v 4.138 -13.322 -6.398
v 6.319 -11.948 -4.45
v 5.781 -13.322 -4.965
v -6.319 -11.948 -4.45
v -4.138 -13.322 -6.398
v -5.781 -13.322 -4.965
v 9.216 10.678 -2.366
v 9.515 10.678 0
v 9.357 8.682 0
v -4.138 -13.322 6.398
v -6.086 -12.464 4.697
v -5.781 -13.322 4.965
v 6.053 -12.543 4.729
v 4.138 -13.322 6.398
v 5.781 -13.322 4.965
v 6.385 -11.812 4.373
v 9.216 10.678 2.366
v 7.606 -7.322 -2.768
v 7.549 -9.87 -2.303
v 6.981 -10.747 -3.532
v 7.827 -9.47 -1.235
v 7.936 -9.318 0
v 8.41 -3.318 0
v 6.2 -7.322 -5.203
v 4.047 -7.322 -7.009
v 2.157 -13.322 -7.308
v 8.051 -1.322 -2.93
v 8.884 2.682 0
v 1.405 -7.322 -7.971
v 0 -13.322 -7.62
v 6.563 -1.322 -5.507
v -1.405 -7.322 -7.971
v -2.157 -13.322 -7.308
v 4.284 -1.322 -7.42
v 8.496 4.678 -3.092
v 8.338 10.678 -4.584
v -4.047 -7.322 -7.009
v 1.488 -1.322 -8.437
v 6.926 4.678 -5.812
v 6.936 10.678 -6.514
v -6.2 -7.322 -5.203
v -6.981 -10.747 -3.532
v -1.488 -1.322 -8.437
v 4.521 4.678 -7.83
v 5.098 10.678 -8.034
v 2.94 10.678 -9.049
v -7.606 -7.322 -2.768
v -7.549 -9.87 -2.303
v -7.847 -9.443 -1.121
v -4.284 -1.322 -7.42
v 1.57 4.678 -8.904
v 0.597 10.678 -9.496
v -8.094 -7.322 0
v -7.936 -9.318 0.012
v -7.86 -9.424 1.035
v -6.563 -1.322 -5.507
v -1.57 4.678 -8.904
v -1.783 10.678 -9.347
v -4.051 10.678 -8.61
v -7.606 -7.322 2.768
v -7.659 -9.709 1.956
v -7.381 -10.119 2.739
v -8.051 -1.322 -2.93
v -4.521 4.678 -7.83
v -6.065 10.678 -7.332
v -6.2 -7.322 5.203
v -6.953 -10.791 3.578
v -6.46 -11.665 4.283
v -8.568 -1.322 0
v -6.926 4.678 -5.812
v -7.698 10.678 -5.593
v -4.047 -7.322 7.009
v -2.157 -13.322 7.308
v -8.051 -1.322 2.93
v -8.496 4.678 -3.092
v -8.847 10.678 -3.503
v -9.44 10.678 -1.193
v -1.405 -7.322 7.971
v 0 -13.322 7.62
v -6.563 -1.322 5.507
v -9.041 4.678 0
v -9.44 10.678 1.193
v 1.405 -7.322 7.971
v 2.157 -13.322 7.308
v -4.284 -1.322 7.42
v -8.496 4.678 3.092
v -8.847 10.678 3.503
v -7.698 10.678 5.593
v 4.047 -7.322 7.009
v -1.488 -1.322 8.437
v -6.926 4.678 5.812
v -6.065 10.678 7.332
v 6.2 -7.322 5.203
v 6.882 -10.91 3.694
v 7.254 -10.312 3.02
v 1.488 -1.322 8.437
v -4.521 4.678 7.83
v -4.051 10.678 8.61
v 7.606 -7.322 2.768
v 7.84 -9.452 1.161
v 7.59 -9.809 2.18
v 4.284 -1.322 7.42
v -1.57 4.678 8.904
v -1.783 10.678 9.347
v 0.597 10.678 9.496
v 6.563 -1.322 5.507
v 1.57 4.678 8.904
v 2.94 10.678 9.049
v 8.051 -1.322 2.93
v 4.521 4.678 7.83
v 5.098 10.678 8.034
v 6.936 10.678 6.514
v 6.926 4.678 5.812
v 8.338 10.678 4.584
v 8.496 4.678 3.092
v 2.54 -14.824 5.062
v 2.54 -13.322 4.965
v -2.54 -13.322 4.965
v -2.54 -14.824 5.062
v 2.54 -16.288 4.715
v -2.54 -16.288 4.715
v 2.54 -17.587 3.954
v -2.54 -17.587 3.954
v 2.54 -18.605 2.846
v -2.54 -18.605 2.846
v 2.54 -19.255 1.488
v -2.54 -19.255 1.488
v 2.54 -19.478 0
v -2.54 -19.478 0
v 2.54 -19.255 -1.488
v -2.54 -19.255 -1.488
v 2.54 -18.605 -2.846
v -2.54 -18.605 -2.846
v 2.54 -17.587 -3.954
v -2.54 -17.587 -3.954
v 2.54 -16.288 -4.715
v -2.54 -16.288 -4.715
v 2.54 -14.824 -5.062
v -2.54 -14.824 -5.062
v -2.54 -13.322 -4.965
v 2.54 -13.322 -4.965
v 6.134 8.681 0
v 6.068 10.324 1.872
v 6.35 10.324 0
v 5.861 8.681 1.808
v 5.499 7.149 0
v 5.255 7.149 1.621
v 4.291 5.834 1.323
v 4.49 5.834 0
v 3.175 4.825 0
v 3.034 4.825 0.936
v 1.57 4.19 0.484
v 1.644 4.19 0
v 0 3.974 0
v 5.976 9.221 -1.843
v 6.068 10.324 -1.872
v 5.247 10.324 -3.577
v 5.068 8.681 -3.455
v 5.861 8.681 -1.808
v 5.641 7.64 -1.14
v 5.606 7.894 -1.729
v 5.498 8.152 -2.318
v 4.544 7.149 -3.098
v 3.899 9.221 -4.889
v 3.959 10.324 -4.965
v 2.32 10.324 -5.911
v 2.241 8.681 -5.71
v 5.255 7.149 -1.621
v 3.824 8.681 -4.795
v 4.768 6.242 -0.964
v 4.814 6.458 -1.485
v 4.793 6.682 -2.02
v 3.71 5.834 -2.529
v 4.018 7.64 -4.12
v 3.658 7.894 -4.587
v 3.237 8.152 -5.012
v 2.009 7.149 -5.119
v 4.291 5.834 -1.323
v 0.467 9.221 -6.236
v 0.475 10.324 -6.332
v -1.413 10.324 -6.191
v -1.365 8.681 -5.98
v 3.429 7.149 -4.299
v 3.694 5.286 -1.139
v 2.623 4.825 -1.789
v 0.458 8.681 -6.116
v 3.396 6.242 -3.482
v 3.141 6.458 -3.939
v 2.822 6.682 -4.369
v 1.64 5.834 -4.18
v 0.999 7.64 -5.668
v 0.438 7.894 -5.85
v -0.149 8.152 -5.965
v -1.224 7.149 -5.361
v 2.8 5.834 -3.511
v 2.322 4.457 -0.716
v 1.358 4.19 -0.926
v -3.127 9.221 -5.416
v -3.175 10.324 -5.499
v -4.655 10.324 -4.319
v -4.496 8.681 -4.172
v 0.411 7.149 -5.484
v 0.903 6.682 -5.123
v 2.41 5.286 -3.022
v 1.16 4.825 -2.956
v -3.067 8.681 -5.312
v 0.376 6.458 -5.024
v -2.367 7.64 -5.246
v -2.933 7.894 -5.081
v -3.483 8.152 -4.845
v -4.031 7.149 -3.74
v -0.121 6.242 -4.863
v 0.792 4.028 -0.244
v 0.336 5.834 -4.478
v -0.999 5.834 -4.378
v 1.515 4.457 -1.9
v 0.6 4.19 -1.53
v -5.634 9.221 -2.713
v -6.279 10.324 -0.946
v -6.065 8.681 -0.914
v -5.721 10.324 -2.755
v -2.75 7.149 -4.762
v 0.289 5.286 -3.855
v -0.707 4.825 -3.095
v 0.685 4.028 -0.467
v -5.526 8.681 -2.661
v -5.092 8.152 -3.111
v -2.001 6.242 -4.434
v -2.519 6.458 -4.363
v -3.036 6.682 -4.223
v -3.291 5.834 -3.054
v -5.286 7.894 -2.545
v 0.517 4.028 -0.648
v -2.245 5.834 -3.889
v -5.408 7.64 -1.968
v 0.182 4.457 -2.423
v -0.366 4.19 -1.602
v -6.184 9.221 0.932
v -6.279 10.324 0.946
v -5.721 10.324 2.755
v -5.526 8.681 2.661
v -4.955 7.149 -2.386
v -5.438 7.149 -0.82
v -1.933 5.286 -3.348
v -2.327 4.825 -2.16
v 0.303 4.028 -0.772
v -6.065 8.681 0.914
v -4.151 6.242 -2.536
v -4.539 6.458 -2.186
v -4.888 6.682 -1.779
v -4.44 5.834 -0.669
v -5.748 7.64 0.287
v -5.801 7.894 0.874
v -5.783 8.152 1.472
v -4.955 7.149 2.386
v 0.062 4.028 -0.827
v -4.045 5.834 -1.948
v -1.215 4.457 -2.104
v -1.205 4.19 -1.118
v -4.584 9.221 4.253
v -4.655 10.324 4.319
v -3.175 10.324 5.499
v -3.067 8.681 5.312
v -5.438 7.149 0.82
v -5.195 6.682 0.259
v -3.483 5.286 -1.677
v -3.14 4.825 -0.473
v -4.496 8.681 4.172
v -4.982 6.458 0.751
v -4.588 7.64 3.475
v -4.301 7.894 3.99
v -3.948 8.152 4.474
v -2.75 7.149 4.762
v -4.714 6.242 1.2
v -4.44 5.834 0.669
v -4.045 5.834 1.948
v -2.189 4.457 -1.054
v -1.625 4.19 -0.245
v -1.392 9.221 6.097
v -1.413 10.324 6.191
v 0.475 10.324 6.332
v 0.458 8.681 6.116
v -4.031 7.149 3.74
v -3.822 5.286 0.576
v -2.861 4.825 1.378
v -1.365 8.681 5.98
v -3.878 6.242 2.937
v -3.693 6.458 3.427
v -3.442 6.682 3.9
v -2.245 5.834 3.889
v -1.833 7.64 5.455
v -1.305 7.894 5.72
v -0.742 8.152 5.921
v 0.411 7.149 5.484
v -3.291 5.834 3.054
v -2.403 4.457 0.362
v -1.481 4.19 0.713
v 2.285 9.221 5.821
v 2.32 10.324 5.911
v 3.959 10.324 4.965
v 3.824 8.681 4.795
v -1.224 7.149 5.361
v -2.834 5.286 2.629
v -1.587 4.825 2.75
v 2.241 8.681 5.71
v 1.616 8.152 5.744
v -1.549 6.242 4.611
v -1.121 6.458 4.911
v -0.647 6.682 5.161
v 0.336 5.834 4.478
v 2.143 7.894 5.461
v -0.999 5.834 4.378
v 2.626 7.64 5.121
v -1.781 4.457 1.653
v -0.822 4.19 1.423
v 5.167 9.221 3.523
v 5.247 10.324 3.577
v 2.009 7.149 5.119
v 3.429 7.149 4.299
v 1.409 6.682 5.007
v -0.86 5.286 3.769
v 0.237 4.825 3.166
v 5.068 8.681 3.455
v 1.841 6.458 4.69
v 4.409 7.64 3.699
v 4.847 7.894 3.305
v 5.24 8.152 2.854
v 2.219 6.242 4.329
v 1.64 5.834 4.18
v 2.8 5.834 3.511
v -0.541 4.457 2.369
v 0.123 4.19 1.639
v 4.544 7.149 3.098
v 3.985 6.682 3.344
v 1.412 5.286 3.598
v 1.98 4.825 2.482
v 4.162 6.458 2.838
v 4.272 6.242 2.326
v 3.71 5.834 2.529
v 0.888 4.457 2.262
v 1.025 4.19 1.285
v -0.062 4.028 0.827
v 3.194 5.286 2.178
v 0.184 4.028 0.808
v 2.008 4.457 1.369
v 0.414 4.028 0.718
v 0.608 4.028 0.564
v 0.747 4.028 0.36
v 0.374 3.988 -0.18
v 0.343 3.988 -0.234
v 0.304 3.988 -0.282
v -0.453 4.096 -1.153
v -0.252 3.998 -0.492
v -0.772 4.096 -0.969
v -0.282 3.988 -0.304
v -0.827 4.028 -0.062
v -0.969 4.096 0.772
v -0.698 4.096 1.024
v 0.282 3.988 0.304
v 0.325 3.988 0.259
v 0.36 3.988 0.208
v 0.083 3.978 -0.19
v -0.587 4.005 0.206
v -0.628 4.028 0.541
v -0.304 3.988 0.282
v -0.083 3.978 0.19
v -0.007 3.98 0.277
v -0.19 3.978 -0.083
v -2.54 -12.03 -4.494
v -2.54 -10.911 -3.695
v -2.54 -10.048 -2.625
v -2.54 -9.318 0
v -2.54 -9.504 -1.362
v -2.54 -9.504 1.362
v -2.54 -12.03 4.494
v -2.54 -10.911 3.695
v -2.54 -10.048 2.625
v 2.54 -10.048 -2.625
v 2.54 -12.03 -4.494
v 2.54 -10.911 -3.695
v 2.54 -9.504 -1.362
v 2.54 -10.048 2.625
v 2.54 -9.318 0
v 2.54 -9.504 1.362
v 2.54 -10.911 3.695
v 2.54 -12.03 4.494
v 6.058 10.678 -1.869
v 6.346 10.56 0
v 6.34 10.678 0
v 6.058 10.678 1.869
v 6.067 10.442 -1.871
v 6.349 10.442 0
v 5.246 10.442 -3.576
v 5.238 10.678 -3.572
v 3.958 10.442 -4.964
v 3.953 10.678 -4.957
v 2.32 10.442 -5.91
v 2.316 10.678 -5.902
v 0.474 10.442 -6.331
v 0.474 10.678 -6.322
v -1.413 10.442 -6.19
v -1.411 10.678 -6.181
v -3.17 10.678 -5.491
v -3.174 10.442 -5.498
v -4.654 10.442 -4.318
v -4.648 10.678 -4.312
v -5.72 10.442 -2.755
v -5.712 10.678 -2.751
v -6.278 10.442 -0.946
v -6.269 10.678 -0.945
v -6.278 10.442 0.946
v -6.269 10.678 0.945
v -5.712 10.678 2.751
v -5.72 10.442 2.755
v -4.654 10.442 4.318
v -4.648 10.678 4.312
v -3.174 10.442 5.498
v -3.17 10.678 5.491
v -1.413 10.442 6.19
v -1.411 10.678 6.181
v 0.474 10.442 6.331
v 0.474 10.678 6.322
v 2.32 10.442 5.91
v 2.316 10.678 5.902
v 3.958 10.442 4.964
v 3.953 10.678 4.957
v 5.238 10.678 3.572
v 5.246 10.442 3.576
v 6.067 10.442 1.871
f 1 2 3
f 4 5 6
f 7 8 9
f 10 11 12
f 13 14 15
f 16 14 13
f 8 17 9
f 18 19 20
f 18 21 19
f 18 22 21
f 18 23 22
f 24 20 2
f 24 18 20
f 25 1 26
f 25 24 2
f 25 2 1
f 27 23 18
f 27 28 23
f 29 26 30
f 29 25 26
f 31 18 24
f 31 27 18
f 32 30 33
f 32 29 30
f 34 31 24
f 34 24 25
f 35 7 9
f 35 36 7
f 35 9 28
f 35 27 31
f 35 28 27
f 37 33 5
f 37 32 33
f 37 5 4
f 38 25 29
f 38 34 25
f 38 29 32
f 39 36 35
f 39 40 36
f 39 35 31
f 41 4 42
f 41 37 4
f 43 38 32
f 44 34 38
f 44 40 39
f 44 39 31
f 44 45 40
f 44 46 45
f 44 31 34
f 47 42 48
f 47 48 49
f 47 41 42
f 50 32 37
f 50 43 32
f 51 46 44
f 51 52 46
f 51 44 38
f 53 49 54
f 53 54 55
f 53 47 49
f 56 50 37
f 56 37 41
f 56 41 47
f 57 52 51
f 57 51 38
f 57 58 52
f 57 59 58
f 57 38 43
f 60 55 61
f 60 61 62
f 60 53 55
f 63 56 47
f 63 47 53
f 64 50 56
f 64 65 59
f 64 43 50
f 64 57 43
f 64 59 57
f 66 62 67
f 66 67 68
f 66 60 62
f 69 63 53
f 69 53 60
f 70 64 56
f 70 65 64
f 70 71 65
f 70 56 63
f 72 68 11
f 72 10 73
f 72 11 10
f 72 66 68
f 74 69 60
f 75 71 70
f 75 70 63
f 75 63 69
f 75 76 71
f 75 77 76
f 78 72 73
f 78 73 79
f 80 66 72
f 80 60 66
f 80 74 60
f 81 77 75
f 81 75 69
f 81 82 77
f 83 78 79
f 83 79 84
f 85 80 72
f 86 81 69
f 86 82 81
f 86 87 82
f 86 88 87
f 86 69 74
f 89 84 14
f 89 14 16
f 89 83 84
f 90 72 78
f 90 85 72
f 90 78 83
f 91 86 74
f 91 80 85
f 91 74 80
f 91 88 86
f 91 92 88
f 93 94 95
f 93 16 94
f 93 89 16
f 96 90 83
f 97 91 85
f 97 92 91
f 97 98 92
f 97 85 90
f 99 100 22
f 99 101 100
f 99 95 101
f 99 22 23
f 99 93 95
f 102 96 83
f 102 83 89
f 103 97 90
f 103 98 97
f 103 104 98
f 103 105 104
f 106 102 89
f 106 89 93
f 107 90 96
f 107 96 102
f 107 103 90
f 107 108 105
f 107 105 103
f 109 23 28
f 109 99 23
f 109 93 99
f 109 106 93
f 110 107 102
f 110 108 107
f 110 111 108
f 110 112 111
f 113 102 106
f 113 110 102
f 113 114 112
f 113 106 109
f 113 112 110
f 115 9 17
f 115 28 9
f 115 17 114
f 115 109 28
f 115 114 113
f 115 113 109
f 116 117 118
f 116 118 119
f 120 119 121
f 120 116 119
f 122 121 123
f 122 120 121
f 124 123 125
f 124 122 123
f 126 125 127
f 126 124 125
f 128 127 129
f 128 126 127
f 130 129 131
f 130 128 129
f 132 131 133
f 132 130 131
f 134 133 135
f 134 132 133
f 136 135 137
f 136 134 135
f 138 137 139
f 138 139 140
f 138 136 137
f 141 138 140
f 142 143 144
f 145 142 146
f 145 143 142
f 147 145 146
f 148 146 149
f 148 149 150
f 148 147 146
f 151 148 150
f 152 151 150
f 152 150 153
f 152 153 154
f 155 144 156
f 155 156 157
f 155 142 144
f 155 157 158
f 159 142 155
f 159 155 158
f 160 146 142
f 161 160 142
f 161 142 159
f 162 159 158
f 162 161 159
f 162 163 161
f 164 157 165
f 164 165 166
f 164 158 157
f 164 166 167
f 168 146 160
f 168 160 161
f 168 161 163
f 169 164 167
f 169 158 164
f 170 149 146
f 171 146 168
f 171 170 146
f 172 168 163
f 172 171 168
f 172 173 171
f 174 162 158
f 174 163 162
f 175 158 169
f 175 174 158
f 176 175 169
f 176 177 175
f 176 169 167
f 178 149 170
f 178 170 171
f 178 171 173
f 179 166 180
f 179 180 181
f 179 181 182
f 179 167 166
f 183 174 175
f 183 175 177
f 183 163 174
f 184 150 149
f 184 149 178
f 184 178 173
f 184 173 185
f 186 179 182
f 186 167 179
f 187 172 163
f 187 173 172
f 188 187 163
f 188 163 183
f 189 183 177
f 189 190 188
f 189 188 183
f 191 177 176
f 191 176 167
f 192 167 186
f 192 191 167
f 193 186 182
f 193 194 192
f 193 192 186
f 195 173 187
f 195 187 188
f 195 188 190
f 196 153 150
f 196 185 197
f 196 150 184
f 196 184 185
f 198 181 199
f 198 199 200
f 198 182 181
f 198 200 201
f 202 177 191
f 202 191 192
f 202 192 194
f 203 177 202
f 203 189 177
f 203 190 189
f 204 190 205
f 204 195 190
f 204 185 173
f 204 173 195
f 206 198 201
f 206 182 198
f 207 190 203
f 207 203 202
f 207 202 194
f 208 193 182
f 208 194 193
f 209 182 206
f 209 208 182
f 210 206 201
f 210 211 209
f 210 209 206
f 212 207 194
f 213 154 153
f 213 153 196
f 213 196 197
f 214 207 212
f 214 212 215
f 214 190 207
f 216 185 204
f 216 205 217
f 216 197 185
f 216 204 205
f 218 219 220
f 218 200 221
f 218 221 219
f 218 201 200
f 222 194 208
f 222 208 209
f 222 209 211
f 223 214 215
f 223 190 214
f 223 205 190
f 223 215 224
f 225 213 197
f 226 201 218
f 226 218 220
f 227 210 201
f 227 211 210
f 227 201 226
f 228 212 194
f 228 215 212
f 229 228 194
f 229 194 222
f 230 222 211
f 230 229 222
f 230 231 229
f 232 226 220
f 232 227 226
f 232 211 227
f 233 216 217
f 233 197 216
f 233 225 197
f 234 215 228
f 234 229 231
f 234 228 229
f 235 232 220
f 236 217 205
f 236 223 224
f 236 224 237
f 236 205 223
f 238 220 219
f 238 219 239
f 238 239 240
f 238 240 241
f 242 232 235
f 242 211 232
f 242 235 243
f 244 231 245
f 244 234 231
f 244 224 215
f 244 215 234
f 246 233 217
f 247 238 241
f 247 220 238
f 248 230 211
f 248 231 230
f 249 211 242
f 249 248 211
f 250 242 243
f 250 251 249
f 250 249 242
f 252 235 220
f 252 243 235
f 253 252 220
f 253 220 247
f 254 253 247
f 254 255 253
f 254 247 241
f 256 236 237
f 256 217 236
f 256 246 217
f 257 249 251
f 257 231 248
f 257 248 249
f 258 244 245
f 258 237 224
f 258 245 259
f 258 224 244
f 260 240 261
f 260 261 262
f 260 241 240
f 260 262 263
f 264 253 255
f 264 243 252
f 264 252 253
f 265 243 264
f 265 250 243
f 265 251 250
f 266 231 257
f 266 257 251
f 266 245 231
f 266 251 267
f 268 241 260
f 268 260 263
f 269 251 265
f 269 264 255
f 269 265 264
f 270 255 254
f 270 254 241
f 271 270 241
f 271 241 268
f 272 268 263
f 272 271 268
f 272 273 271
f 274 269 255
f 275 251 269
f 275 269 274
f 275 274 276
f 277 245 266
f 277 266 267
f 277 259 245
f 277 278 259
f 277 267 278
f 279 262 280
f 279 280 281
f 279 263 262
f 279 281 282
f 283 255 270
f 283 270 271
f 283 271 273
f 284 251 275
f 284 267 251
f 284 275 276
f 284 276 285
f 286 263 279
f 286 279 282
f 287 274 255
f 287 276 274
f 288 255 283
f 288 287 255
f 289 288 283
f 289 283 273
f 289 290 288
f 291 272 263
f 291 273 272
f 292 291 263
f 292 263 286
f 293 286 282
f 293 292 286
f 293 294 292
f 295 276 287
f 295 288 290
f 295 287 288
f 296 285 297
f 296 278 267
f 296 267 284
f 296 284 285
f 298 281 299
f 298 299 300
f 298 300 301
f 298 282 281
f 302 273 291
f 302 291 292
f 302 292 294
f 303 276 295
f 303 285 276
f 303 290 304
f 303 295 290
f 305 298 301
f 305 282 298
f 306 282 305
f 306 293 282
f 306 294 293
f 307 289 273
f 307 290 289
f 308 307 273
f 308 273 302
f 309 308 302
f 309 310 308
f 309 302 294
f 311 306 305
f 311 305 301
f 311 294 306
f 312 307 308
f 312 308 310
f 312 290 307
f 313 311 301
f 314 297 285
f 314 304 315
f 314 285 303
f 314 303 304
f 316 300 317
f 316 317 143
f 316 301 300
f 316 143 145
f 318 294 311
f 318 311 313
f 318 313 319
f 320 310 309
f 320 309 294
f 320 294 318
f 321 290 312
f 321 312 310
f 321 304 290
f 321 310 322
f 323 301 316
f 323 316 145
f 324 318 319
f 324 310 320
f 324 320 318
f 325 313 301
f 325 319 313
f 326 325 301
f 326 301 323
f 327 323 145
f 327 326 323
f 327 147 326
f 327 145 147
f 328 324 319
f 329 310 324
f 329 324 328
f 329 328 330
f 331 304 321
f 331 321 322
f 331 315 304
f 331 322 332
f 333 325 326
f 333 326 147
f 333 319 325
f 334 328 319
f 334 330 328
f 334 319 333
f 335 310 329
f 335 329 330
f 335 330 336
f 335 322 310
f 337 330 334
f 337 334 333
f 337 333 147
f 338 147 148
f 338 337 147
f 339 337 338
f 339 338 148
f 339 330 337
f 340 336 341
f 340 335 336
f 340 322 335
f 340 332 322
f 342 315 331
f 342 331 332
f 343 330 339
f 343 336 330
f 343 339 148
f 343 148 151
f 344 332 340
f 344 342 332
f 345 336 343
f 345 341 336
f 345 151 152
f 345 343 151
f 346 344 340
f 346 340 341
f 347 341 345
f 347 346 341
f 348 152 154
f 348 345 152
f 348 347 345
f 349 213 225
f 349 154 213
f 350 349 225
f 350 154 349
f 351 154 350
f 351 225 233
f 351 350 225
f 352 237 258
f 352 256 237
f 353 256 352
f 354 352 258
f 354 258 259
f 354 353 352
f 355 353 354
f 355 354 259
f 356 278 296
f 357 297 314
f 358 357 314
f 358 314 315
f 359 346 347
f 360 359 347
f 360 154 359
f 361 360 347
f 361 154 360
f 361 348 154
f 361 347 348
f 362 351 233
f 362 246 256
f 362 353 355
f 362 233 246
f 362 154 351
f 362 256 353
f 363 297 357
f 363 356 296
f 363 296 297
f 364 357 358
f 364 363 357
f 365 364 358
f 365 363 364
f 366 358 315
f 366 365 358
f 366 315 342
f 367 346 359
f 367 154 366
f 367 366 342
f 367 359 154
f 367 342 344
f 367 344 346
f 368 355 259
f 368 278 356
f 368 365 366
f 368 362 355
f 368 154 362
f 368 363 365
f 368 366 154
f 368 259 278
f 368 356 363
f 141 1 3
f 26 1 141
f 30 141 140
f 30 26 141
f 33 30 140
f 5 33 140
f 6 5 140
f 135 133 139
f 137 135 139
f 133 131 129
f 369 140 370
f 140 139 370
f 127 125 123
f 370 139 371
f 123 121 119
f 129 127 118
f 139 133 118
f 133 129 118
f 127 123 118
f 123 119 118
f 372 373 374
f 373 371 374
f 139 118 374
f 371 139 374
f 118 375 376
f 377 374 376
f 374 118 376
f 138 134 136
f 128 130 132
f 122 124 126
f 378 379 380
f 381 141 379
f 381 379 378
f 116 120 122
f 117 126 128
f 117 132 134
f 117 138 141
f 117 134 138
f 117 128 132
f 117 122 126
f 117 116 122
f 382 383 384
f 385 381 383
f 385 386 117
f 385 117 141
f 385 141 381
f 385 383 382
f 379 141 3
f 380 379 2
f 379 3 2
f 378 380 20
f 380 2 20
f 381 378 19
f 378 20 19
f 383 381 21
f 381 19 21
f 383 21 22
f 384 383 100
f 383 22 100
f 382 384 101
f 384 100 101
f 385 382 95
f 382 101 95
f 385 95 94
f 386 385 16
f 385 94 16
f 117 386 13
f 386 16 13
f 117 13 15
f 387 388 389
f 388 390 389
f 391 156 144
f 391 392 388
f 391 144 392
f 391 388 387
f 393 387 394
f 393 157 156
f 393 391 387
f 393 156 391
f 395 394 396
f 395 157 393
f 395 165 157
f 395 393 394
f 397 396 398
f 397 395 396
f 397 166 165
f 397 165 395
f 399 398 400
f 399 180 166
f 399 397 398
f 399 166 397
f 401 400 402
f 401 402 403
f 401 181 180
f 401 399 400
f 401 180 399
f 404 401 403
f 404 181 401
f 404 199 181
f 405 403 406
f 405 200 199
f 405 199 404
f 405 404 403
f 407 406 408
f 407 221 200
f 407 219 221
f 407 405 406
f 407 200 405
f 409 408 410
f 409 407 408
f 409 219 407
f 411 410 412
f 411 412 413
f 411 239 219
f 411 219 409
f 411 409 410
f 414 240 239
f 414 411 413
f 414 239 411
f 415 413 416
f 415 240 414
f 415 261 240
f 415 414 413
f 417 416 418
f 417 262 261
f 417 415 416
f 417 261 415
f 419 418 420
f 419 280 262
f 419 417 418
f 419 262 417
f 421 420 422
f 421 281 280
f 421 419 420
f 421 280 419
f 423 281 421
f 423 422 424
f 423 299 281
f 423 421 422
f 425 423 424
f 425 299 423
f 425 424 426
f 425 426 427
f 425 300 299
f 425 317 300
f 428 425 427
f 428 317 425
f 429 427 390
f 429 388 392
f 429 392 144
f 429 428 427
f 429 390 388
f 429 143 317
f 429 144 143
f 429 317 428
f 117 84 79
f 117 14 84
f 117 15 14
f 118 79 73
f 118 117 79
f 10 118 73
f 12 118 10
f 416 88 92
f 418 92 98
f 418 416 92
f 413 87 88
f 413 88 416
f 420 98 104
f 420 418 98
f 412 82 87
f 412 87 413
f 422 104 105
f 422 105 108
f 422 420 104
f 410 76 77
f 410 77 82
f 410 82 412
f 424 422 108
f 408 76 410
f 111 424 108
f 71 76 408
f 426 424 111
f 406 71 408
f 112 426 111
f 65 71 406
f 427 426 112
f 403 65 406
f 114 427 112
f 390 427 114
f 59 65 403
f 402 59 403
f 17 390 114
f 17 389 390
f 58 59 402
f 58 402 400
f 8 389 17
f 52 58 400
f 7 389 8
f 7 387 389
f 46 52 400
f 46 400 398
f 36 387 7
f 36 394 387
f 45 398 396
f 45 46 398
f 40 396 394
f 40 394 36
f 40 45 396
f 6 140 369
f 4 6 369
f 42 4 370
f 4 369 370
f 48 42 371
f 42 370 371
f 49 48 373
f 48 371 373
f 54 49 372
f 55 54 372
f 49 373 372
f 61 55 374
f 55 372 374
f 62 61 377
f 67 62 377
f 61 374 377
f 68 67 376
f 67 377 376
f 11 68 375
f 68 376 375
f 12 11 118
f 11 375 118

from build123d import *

# Parameters (mm, degrees)
F2_R     = 5.08
F3_DEPTH = 25.4
F4_DEPTH = 2.54


with BuildPart() as f1:
    # F0 (on Top) → F1 (revolve)
    with BuildSketch(Plane.XY):
        with BuildLine():
            ThreePointArc((6.34011, 10.678397), (6.347527, 10.501329), (6.35, 10.324123))
            ThreePointArc((6.35, 10.324123), (4.490128, 5.833995), (0, 3.974123))
            Line((0, 3.974123), (0, -13.321603))
            Line((0, -13.321603), (7.62, -13.321603))
            Line((7.62, -13.321603), (9.51511, 10.678397))
            Line((9.51511, 10.678397), (6.34011, 10.678397))
        make_face()
    revolve(axis=Axis((0, -4.67374, 0), (0, 1, 0)))

    # F2 (on Right) → F3 (cut, symmetric)
    with BuildSketch(Plane.YZ):
        with Locations((-14.397663, 0)):
            Circle(F2_R)
    extrude(amount=F3_DEPTH, both=True, mode=Mode.SUBTRACT)

    # F2 (on Right) → F4 (join, symmetric)
    with BuildSketch(Plane.YZ):
        with Locations((-14.397663, 0)):
            Circle(F2_R)
    extrude(amount=F4_DEPTH, both=True)


solid = f1.part
